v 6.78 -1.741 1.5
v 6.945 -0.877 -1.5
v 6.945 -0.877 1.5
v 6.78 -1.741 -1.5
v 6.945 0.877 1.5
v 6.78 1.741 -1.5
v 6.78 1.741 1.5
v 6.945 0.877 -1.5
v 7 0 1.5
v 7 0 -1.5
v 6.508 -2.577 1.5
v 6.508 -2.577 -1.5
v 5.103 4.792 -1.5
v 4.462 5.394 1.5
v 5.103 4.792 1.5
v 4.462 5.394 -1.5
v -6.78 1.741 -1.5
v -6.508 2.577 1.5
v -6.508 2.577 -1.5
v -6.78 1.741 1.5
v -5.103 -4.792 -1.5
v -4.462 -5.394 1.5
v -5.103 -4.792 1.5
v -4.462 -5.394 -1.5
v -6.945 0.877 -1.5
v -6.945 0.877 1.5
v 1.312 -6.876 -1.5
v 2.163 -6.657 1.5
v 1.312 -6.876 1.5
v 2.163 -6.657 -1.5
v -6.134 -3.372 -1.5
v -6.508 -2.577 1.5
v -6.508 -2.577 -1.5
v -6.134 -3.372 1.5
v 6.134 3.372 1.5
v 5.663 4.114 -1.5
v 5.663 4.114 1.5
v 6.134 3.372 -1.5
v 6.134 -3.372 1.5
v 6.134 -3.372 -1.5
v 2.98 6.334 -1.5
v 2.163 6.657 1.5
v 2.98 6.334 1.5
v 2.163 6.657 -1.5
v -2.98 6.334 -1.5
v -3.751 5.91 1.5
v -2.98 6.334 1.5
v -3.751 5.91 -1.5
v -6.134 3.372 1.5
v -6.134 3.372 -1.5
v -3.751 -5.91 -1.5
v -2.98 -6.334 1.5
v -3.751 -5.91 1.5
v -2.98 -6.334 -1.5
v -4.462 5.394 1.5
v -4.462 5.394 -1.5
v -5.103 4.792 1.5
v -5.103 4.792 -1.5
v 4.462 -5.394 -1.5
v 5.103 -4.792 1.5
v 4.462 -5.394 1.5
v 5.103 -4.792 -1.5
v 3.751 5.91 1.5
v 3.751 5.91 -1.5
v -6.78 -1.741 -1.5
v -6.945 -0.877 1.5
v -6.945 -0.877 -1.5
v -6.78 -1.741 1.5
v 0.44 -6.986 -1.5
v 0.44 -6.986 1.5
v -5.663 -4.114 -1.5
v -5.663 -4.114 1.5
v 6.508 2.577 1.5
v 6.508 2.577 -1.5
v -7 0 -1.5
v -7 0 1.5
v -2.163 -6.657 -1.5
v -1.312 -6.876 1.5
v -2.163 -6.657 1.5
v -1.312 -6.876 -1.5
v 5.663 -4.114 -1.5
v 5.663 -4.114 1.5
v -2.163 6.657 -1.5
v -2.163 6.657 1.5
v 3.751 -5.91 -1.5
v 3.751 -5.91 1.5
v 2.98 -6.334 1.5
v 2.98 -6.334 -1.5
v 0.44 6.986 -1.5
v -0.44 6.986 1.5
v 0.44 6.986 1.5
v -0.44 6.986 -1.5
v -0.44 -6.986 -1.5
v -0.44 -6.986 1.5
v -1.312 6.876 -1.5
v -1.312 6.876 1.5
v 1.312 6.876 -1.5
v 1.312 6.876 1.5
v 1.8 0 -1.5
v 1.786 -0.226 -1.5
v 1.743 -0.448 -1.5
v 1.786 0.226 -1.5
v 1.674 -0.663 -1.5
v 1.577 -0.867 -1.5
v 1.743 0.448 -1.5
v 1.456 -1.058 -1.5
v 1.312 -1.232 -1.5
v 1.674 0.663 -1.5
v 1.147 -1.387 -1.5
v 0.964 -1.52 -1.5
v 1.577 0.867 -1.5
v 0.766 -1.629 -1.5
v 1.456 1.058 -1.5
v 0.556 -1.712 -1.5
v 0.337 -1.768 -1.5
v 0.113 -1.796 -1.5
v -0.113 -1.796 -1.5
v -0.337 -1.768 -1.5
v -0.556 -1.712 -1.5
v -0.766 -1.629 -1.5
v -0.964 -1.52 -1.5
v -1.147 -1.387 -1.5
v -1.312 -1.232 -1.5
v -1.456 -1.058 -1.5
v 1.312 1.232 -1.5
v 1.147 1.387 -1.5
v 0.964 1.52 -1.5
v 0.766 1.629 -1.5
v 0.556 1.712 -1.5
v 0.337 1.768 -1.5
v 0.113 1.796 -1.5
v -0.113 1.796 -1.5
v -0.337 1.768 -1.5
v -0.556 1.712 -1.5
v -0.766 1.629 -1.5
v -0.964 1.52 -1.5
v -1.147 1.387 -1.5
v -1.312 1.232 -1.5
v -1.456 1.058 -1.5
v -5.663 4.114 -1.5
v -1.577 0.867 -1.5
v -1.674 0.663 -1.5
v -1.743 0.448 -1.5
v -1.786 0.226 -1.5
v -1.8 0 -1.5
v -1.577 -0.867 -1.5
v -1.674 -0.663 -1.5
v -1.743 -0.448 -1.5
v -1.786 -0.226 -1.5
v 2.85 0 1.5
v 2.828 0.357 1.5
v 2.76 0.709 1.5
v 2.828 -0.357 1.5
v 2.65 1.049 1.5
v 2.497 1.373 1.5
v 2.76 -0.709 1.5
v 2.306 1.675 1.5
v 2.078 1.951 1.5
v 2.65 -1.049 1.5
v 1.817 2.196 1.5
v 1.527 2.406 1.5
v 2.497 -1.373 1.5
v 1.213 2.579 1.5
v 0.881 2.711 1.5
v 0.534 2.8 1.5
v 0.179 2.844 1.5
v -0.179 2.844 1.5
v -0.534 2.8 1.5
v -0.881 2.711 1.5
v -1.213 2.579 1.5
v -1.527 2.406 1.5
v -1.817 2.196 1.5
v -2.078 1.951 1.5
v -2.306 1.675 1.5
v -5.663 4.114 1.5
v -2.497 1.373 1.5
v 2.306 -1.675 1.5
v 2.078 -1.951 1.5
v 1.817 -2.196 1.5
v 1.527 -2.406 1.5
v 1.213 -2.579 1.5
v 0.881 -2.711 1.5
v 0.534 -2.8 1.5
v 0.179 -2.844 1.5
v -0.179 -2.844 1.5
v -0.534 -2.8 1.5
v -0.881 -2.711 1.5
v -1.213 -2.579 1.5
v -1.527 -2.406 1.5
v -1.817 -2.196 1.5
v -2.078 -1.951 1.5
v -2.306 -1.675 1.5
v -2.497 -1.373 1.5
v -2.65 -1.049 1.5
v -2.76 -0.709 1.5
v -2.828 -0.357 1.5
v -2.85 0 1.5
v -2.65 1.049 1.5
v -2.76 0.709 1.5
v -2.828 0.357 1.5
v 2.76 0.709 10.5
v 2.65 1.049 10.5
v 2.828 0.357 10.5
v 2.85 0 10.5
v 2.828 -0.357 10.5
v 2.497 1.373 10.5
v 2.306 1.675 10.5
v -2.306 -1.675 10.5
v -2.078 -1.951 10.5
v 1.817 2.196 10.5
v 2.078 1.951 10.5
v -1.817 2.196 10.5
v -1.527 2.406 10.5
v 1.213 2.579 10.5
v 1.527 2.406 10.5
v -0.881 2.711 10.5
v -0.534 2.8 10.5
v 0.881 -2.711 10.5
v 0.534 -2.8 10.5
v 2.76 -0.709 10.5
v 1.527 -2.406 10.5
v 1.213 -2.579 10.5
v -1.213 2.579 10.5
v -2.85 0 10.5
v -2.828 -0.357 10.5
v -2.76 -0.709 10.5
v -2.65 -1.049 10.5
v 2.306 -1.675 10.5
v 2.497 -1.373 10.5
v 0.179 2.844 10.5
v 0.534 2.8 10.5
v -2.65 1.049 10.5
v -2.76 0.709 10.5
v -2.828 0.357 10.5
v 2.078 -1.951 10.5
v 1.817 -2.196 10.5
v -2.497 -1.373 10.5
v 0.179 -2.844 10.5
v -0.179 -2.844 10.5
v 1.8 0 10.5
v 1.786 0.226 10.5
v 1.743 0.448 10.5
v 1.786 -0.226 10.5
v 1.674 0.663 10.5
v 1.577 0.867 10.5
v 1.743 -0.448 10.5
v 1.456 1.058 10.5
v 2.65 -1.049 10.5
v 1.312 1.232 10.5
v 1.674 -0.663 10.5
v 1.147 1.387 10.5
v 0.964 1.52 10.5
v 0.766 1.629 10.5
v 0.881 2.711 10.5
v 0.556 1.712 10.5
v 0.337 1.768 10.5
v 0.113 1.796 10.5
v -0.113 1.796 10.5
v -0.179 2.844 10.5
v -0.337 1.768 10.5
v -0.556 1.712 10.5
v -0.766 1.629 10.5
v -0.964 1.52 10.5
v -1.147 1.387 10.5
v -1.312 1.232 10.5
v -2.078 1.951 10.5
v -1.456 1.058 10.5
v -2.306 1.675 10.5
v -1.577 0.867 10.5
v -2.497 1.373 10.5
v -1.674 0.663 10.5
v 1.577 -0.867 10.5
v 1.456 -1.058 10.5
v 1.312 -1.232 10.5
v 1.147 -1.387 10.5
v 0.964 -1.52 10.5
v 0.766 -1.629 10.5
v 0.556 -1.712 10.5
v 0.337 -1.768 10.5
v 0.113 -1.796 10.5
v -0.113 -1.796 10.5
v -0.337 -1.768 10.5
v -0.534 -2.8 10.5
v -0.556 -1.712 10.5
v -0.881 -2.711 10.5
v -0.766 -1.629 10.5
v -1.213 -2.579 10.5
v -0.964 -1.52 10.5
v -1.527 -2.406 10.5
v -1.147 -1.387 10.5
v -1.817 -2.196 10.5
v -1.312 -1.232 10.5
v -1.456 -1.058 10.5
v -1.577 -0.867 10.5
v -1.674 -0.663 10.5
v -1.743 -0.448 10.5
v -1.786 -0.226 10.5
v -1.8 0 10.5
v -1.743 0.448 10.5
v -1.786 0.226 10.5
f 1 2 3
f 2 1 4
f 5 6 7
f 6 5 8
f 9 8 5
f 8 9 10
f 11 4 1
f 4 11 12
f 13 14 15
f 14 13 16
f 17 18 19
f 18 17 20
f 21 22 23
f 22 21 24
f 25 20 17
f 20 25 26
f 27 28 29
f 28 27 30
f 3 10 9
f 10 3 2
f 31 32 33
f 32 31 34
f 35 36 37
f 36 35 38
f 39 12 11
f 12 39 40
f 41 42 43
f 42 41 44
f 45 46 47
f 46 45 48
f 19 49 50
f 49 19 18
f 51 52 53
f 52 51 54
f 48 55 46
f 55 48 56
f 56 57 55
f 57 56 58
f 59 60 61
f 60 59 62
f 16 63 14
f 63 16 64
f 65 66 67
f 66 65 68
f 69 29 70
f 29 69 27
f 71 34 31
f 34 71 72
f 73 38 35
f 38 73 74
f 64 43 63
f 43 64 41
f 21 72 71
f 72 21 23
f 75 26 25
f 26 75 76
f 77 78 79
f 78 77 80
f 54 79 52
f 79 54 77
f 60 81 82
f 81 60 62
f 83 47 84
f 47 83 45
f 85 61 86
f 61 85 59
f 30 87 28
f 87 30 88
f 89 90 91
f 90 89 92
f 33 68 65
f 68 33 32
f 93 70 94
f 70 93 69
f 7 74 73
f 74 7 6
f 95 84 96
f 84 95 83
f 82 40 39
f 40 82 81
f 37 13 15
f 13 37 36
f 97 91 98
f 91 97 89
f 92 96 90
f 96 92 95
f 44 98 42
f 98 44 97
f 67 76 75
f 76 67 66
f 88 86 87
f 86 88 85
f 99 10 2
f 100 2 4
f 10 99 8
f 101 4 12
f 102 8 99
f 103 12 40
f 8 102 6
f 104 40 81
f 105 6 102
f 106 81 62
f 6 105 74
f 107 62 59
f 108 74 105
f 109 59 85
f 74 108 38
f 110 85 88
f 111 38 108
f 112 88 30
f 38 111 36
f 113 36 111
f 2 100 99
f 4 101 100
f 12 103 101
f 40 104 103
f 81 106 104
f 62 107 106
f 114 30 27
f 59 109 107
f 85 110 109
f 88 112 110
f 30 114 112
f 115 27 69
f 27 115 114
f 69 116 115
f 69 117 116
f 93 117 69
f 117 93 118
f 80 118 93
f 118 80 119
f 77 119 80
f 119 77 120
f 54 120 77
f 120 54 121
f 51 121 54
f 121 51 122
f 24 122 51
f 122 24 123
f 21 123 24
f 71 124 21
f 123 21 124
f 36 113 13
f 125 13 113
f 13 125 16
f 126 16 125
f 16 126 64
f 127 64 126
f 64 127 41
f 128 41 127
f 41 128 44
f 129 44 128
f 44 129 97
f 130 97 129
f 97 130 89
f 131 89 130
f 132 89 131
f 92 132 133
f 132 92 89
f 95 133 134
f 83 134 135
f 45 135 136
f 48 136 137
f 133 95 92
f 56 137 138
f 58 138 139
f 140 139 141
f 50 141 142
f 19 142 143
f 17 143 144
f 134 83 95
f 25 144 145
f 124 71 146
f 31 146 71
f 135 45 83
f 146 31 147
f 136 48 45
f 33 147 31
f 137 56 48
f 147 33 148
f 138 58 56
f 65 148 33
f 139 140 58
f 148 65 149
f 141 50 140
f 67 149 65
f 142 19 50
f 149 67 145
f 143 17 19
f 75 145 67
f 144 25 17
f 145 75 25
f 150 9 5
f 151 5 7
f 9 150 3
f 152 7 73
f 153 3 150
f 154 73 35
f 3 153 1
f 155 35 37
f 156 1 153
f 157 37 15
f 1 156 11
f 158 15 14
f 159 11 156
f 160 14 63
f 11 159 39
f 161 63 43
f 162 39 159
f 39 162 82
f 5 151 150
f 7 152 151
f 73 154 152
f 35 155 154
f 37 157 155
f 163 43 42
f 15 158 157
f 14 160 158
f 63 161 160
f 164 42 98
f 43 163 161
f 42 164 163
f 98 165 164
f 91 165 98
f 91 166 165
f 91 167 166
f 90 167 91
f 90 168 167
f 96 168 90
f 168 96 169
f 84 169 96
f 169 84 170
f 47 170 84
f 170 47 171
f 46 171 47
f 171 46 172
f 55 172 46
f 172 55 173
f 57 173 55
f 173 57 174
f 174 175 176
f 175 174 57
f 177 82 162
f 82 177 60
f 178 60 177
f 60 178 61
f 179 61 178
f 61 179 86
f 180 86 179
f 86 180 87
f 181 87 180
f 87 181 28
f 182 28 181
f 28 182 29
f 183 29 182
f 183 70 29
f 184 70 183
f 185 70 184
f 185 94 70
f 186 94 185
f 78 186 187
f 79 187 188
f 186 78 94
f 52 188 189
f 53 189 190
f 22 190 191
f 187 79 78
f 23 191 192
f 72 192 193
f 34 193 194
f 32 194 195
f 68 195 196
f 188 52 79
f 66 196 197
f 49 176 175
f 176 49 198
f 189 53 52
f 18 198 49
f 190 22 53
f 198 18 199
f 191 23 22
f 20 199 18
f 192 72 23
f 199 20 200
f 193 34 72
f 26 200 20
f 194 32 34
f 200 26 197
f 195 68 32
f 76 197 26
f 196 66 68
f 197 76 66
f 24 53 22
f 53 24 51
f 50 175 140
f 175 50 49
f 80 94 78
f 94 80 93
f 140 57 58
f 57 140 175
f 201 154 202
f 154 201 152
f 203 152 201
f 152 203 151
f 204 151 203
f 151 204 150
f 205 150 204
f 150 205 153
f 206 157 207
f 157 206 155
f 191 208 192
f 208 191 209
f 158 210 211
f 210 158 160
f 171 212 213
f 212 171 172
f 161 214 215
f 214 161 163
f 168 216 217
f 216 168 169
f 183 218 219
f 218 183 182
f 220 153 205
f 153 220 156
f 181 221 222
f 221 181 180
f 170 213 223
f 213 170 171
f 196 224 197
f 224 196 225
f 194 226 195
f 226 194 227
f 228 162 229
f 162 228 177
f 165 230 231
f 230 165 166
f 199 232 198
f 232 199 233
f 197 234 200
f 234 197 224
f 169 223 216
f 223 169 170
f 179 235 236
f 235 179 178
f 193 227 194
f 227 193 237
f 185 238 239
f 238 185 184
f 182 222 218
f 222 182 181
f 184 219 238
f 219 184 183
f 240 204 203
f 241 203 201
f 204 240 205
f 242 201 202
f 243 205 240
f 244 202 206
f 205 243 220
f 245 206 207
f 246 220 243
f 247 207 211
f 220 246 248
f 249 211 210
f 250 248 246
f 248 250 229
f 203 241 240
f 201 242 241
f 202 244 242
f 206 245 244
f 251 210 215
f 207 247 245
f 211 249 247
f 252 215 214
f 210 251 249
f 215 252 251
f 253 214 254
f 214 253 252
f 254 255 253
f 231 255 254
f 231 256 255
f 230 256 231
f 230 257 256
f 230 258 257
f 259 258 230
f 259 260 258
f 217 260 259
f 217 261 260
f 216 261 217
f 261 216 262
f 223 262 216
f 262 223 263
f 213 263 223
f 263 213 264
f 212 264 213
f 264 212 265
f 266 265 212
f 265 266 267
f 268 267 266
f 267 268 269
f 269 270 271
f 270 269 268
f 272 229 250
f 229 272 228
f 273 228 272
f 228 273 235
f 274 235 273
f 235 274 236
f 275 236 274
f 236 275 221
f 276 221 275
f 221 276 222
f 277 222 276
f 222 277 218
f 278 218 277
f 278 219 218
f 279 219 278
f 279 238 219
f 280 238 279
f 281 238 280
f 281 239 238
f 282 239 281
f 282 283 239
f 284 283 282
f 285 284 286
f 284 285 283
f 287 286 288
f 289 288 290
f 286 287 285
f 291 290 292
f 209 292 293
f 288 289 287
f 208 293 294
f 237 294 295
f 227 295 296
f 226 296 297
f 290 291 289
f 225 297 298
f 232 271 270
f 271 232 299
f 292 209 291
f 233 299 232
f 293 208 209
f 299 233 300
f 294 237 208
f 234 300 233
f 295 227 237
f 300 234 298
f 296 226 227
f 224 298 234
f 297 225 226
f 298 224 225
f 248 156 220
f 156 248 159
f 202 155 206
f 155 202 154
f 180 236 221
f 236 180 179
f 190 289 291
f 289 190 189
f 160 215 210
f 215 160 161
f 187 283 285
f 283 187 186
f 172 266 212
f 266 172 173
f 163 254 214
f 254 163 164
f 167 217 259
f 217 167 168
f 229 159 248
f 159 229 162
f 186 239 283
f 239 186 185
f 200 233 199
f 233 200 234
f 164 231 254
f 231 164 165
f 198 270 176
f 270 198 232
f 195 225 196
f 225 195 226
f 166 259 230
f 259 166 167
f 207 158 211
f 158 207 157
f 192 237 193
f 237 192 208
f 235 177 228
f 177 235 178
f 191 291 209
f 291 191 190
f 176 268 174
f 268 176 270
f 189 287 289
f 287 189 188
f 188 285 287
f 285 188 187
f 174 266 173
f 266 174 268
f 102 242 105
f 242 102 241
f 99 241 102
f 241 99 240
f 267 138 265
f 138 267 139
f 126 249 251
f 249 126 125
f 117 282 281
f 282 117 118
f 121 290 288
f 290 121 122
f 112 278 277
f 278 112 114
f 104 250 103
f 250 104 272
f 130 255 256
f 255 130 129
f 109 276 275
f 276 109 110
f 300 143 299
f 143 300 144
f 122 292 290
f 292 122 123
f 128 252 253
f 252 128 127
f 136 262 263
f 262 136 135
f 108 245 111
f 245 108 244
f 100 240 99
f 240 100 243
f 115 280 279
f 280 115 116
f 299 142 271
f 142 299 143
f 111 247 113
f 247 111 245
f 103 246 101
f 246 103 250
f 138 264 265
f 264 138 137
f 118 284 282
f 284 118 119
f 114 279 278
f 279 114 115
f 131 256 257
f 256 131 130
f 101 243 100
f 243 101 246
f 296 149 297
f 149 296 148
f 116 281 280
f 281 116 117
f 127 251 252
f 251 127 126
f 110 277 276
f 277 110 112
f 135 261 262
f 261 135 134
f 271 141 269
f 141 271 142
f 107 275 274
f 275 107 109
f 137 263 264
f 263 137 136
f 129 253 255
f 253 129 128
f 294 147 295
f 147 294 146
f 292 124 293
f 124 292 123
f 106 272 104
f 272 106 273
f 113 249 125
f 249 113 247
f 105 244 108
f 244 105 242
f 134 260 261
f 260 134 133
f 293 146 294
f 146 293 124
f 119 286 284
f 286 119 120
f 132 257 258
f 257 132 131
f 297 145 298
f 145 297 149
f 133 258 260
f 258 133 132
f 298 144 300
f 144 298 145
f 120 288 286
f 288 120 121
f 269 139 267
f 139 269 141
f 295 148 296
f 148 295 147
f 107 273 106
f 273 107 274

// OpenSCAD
$fn = 50;


difference() {
	union() {
		translate(v = [0, 0, -1.5000000000]) {
			cylinder(h = 3, r = 7.0000000000);
		}
		translate(v = [0, 0, -1.5000000000]) {
			cylinder(h = 12, r = 2.8500000000);
		}
	}
	union() {
		translate(v = [0, 0, -100.0000000000]) {
			cylinder(h = 200, r = 1.8000000000);
		}
	}
}
